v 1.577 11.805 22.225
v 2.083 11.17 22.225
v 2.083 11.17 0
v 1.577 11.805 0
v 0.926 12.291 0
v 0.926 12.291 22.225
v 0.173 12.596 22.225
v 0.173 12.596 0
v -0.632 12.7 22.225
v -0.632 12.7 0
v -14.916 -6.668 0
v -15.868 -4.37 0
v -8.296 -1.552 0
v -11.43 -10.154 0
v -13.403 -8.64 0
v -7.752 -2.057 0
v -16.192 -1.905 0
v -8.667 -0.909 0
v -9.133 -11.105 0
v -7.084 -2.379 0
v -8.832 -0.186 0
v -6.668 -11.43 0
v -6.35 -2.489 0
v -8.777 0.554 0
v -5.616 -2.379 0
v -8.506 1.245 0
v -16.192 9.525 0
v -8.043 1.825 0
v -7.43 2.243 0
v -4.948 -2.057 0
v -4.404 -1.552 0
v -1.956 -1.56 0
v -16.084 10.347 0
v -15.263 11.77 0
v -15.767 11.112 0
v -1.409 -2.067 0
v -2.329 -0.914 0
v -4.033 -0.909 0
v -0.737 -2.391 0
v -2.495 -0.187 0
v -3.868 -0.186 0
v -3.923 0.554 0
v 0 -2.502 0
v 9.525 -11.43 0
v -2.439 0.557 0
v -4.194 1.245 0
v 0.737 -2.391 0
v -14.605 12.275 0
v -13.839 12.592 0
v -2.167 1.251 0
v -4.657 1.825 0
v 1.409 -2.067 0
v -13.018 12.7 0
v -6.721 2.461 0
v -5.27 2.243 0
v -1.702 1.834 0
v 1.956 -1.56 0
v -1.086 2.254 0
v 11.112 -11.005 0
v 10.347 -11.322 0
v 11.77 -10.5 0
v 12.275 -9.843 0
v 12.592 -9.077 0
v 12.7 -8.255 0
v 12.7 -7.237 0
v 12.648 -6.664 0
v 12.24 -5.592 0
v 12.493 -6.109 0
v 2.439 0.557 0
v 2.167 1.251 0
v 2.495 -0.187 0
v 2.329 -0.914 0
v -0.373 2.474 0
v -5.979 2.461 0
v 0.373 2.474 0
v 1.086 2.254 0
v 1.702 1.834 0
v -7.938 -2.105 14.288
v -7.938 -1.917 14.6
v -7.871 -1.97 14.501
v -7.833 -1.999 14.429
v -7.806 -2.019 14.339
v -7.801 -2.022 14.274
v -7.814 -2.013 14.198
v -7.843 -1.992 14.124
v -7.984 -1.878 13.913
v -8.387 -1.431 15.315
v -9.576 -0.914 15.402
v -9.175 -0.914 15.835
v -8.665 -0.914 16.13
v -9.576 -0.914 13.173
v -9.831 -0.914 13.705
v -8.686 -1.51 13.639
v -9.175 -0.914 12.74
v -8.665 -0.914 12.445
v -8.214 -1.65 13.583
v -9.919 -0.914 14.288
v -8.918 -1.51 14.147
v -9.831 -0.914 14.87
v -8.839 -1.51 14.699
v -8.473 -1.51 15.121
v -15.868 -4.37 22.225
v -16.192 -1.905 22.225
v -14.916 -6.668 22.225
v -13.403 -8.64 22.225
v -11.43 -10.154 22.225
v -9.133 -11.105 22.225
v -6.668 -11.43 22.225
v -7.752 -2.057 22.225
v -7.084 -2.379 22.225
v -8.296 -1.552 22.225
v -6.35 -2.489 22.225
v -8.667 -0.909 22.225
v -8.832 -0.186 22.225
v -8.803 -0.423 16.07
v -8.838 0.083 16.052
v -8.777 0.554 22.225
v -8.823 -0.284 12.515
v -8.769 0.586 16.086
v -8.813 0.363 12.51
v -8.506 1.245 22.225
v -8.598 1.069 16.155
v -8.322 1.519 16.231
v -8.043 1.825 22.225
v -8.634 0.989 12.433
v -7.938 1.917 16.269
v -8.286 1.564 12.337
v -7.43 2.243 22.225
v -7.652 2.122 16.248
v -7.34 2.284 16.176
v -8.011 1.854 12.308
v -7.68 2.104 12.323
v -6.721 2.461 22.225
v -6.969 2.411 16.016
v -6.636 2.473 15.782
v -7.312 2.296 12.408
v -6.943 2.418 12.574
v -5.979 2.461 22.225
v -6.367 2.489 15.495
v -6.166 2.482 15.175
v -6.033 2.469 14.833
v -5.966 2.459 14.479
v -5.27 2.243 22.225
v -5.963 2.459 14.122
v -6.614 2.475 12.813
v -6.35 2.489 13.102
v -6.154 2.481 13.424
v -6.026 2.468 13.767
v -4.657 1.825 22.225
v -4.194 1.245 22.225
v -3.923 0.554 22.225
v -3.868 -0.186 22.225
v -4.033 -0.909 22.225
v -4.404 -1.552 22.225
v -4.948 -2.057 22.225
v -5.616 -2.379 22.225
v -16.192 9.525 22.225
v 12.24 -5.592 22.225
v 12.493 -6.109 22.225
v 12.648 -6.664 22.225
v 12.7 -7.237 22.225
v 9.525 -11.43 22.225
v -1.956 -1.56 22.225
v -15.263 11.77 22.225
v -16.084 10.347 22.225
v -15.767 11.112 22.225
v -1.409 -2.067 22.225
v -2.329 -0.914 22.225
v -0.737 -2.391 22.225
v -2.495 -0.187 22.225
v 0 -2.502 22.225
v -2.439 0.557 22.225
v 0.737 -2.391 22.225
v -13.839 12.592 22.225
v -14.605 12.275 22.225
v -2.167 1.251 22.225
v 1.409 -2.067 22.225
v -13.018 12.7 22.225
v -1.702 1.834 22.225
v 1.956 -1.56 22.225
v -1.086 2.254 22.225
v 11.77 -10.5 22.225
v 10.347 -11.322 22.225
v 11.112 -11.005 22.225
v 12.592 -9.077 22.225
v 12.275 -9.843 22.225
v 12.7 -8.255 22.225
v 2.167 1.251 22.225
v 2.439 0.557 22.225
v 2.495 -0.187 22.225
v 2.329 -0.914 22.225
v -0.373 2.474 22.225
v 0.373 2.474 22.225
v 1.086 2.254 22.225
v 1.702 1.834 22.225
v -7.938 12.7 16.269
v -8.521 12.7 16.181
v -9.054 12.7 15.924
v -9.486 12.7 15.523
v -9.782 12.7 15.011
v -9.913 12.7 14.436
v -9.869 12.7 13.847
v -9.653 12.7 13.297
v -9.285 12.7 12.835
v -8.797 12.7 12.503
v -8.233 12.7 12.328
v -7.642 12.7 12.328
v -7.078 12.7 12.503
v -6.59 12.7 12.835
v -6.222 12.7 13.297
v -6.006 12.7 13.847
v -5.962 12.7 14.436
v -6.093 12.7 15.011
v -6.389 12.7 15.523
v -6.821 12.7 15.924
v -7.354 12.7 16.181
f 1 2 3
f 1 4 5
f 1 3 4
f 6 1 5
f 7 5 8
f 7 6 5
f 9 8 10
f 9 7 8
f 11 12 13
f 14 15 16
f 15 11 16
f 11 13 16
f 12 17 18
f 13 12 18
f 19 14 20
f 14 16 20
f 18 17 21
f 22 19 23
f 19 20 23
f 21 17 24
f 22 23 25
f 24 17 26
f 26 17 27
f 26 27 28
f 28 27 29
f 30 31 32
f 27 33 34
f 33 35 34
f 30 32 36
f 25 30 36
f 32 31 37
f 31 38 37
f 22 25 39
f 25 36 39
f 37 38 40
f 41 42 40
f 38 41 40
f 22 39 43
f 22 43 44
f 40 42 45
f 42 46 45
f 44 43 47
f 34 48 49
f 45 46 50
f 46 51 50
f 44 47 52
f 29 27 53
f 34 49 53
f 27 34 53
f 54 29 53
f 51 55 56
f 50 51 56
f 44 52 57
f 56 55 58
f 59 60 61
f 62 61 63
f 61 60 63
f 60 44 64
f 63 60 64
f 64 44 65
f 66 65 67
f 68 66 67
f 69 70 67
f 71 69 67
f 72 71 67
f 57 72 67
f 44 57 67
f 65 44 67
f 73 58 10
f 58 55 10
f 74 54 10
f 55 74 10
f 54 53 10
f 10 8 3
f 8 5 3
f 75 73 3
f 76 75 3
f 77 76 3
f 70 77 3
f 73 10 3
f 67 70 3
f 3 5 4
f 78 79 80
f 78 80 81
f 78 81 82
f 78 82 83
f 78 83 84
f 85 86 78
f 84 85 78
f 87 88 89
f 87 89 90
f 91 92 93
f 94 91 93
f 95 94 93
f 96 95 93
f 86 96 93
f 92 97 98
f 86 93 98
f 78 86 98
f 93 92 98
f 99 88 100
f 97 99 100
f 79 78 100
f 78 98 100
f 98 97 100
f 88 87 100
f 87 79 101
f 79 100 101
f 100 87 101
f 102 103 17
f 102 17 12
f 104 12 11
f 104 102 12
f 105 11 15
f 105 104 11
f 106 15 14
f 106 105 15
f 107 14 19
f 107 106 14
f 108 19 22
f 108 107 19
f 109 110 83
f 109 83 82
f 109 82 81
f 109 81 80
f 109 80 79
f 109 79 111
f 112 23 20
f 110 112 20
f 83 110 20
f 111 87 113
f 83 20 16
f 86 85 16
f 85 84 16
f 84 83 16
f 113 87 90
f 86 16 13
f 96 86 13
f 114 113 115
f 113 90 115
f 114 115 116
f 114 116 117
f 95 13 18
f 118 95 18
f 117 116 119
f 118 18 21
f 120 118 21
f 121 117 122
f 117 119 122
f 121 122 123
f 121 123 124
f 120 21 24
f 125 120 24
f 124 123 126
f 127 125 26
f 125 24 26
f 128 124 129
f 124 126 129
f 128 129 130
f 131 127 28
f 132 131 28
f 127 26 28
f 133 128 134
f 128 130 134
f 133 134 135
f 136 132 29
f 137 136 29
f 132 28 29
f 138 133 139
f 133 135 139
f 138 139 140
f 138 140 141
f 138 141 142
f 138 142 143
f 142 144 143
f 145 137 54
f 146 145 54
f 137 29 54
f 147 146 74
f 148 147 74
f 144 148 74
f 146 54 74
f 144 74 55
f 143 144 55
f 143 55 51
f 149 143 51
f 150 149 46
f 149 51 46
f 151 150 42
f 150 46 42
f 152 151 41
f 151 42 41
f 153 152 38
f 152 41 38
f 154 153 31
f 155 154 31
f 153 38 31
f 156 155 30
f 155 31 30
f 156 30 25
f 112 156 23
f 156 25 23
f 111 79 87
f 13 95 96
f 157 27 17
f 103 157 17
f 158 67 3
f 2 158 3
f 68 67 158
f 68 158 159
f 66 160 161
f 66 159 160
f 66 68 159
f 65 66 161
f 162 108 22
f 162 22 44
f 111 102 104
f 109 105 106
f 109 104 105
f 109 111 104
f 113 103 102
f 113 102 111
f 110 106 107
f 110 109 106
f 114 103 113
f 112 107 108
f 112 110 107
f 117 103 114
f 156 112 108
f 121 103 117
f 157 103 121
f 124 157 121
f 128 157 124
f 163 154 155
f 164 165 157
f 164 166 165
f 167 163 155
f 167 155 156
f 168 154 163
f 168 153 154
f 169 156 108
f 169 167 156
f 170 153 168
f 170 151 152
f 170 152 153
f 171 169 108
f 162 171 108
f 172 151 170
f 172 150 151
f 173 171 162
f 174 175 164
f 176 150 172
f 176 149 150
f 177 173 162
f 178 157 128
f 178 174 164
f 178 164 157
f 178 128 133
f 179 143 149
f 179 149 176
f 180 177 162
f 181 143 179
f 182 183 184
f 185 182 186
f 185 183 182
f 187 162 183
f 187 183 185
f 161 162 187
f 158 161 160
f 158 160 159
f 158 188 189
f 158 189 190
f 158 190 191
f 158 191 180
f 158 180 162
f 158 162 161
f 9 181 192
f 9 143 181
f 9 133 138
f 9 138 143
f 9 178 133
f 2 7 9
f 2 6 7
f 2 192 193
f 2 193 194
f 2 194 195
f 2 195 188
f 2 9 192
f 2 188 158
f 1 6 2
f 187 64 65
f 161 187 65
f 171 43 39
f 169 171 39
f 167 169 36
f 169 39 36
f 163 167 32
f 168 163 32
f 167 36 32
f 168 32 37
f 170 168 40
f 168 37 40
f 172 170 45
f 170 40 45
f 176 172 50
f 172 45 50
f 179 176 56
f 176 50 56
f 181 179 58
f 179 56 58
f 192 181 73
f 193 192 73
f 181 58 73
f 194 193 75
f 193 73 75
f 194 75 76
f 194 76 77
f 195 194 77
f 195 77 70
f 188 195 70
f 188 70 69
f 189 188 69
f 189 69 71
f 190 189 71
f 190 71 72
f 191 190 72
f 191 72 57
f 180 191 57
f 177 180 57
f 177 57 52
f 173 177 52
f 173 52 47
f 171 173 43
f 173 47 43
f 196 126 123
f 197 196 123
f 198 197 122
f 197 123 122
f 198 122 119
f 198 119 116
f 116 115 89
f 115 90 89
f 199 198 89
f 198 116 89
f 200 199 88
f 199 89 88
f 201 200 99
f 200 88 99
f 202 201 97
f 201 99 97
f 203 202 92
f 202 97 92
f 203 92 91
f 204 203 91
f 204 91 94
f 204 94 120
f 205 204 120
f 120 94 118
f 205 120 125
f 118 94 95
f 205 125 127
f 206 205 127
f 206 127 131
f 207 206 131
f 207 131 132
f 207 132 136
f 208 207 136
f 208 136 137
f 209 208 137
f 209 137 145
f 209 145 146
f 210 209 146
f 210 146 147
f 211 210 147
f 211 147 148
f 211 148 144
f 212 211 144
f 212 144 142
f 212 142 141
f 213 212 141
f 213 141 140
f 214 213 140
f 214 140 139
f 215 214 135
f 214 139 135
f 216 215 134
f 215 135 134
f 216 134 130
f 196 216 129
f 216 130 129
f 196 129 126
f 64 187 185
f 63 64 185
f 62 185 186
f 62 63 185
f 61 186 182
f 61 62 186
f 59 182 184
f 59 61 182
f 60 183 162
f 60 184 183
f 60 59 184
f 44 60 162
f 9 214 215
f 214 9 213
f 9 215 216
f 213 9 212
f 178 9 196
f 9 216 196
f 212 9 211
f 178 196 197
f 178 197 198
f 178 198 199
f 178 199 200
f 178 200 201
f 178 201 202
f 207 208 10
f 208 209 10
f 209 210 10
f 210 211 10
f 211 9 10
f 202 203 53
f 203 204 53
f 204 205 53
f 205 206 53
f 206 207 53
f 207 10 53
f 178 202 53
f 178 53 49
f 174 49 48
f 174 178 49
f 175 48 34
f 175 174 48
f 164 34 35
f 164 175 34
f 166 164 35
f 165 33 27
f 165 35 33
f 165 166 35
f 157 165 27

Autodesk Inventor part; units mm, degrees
ref_plane "YZ Plane" through (0, 0, 0) normal (1, 0, 0) x (0, 1, 0)
ref_plane "XZ Plane" through (0, 0, 0) normal (0, 1, 0) x (-1, 0, 0)
ref_plane "XY Plane" through (0, 0, 0) normal (0, 0, 1) x (1, 0, 0)
sketch "Sketch1" plane through (0, 0, 0) normal (0, 0, 1) x (1, 0, 0)
  arc A0 (5.1615, 6.0904) -> (2.4461, 7.62) centre (2.4461, 4.445) ccw construction
  line L0 (2.4461, 7.62) -> (-28.575, 7.62) construction
  arc A1 (-28.575, 7.62) -> (-31.75, 4.445) centre (-28.575, 4.445) ccw construction
  line L1 (-31.75, 4.445) -> (-31.75, -0.344) construction
  arc A2 (-31.75, -0.344) -> (-31.6418, -1.1658) centre (-28.575, -0.344) ccw construction
  line L2 (-29.5221, -9.0768) -> (-31.6418, -1.1658) construction
  arc A3 (-29.5221, -9.0768) -> (-26.4553, -11.43) centre (-26.4553, -8.255) ccw construction
  line L3 (-26.4553, -11.43) -> (9.525, -11.43) construction
  arc A4 (9.525, -11.43) -> (12.7, -8.255) centre (9.525, -8.255) ccw
  line L4 (12.7, -8.255) -> (12.7, -7.2369)
  arc A5 (12.7, -7.2369) -> (12.2404, -5.5915) centre (9.525, -7.2369) ccw
  line L5 (5.1615, 6.0904) -> (12.2404, -5.5915) construction
  line L6 (4.7625, 12.7) -> (-16.1925, 12.7)
  line L7 (-16.1925, 12.7) -> (-16.1925, -11.43)
  line L8 (-16.1925, -11.43) -> (4.7625, -11.43)
  line L9 (4.7625, -11.43) -> (4.7625, 12.7) construction
  line L10 (4.7625, -11.43) -> (9.525, -11.43)
  line L11 (12.2404, -5.5915) -> (1.1563, 12.7)
  point P0 (0, 0)
  dimension "d0" = 20.955
  dimension "d1" = 24.13
  dimension "d2" = 4.7625
extrude "Extrusion1" add sketch "Sketch1" along normal blind 22.225
sketch "Sketch2" plane through (0, 0, 22.225) normal (0, 0, 1) x (1, 0, 0)
  circle A0 centre (0, 0) radius 2.5019 construction
  circle A1 centre (-6.35, 0) radius 2.5527 construction
  circle A2 centre (-19.05, 0) radius 2.5527 construction
  circle A3 centre (-25.4, 0) radius 2.5019 construction
  point P0 (0, 0)
hole "Hole1" at (0, 0, 22.225) direction (0, 0, -1) diameter 5.0038 end through all clearance for "H7 - STANDARD FIT" size "5" standard "CL-DOWEL-MET"
hole "Hole2" at (-6.35, 0, 22.225) at (-19.05, 0, 22.225) direction (0, 0, -1) diameter 4.9784 end through all clearance for "Flat Head Machine Screw (82)" size "#10" standard "Ansi Unified Screw Threads"
sketch "Sketch3" plane through (-16.1925, 12.7, 0) normal (0, 1, 0) x (1, 0, 0)
  line L0 (16.1925, -14.2875) -> (8.255, -14.2875) construction
  line L1 (-46.1199, -6.35) -> (861.9301, -6.35) construction
  line L2 (0, 0) -> (0, -22.225) construction
  point P0 (16.1925, 0)
  dimension "d19" = 7.9375
  dimension "d21" = 7.9375
  dimension "d31" = 8.255
hole "Hole3" at (-7.9375, 12.7, 14.2875) direction (0, -1, 0) diameter 3.9624 depth 13.6144 tip angle 118 thread size "10-32 UNF" class "2B" standard "ANSI Unified Screw Threads"
fillet "Fillet1" radius 9.525 1 edges at (-16.1925, -11.43, 11.1125)
fillet "Fillet2" radius 3.175 2 edges at (-16.1925, 12.7, 11.1125) (1.1563, 12.7, 11.1125)
properties part number "BEARING,MOUNT,SIDE,ELEVATOR"
